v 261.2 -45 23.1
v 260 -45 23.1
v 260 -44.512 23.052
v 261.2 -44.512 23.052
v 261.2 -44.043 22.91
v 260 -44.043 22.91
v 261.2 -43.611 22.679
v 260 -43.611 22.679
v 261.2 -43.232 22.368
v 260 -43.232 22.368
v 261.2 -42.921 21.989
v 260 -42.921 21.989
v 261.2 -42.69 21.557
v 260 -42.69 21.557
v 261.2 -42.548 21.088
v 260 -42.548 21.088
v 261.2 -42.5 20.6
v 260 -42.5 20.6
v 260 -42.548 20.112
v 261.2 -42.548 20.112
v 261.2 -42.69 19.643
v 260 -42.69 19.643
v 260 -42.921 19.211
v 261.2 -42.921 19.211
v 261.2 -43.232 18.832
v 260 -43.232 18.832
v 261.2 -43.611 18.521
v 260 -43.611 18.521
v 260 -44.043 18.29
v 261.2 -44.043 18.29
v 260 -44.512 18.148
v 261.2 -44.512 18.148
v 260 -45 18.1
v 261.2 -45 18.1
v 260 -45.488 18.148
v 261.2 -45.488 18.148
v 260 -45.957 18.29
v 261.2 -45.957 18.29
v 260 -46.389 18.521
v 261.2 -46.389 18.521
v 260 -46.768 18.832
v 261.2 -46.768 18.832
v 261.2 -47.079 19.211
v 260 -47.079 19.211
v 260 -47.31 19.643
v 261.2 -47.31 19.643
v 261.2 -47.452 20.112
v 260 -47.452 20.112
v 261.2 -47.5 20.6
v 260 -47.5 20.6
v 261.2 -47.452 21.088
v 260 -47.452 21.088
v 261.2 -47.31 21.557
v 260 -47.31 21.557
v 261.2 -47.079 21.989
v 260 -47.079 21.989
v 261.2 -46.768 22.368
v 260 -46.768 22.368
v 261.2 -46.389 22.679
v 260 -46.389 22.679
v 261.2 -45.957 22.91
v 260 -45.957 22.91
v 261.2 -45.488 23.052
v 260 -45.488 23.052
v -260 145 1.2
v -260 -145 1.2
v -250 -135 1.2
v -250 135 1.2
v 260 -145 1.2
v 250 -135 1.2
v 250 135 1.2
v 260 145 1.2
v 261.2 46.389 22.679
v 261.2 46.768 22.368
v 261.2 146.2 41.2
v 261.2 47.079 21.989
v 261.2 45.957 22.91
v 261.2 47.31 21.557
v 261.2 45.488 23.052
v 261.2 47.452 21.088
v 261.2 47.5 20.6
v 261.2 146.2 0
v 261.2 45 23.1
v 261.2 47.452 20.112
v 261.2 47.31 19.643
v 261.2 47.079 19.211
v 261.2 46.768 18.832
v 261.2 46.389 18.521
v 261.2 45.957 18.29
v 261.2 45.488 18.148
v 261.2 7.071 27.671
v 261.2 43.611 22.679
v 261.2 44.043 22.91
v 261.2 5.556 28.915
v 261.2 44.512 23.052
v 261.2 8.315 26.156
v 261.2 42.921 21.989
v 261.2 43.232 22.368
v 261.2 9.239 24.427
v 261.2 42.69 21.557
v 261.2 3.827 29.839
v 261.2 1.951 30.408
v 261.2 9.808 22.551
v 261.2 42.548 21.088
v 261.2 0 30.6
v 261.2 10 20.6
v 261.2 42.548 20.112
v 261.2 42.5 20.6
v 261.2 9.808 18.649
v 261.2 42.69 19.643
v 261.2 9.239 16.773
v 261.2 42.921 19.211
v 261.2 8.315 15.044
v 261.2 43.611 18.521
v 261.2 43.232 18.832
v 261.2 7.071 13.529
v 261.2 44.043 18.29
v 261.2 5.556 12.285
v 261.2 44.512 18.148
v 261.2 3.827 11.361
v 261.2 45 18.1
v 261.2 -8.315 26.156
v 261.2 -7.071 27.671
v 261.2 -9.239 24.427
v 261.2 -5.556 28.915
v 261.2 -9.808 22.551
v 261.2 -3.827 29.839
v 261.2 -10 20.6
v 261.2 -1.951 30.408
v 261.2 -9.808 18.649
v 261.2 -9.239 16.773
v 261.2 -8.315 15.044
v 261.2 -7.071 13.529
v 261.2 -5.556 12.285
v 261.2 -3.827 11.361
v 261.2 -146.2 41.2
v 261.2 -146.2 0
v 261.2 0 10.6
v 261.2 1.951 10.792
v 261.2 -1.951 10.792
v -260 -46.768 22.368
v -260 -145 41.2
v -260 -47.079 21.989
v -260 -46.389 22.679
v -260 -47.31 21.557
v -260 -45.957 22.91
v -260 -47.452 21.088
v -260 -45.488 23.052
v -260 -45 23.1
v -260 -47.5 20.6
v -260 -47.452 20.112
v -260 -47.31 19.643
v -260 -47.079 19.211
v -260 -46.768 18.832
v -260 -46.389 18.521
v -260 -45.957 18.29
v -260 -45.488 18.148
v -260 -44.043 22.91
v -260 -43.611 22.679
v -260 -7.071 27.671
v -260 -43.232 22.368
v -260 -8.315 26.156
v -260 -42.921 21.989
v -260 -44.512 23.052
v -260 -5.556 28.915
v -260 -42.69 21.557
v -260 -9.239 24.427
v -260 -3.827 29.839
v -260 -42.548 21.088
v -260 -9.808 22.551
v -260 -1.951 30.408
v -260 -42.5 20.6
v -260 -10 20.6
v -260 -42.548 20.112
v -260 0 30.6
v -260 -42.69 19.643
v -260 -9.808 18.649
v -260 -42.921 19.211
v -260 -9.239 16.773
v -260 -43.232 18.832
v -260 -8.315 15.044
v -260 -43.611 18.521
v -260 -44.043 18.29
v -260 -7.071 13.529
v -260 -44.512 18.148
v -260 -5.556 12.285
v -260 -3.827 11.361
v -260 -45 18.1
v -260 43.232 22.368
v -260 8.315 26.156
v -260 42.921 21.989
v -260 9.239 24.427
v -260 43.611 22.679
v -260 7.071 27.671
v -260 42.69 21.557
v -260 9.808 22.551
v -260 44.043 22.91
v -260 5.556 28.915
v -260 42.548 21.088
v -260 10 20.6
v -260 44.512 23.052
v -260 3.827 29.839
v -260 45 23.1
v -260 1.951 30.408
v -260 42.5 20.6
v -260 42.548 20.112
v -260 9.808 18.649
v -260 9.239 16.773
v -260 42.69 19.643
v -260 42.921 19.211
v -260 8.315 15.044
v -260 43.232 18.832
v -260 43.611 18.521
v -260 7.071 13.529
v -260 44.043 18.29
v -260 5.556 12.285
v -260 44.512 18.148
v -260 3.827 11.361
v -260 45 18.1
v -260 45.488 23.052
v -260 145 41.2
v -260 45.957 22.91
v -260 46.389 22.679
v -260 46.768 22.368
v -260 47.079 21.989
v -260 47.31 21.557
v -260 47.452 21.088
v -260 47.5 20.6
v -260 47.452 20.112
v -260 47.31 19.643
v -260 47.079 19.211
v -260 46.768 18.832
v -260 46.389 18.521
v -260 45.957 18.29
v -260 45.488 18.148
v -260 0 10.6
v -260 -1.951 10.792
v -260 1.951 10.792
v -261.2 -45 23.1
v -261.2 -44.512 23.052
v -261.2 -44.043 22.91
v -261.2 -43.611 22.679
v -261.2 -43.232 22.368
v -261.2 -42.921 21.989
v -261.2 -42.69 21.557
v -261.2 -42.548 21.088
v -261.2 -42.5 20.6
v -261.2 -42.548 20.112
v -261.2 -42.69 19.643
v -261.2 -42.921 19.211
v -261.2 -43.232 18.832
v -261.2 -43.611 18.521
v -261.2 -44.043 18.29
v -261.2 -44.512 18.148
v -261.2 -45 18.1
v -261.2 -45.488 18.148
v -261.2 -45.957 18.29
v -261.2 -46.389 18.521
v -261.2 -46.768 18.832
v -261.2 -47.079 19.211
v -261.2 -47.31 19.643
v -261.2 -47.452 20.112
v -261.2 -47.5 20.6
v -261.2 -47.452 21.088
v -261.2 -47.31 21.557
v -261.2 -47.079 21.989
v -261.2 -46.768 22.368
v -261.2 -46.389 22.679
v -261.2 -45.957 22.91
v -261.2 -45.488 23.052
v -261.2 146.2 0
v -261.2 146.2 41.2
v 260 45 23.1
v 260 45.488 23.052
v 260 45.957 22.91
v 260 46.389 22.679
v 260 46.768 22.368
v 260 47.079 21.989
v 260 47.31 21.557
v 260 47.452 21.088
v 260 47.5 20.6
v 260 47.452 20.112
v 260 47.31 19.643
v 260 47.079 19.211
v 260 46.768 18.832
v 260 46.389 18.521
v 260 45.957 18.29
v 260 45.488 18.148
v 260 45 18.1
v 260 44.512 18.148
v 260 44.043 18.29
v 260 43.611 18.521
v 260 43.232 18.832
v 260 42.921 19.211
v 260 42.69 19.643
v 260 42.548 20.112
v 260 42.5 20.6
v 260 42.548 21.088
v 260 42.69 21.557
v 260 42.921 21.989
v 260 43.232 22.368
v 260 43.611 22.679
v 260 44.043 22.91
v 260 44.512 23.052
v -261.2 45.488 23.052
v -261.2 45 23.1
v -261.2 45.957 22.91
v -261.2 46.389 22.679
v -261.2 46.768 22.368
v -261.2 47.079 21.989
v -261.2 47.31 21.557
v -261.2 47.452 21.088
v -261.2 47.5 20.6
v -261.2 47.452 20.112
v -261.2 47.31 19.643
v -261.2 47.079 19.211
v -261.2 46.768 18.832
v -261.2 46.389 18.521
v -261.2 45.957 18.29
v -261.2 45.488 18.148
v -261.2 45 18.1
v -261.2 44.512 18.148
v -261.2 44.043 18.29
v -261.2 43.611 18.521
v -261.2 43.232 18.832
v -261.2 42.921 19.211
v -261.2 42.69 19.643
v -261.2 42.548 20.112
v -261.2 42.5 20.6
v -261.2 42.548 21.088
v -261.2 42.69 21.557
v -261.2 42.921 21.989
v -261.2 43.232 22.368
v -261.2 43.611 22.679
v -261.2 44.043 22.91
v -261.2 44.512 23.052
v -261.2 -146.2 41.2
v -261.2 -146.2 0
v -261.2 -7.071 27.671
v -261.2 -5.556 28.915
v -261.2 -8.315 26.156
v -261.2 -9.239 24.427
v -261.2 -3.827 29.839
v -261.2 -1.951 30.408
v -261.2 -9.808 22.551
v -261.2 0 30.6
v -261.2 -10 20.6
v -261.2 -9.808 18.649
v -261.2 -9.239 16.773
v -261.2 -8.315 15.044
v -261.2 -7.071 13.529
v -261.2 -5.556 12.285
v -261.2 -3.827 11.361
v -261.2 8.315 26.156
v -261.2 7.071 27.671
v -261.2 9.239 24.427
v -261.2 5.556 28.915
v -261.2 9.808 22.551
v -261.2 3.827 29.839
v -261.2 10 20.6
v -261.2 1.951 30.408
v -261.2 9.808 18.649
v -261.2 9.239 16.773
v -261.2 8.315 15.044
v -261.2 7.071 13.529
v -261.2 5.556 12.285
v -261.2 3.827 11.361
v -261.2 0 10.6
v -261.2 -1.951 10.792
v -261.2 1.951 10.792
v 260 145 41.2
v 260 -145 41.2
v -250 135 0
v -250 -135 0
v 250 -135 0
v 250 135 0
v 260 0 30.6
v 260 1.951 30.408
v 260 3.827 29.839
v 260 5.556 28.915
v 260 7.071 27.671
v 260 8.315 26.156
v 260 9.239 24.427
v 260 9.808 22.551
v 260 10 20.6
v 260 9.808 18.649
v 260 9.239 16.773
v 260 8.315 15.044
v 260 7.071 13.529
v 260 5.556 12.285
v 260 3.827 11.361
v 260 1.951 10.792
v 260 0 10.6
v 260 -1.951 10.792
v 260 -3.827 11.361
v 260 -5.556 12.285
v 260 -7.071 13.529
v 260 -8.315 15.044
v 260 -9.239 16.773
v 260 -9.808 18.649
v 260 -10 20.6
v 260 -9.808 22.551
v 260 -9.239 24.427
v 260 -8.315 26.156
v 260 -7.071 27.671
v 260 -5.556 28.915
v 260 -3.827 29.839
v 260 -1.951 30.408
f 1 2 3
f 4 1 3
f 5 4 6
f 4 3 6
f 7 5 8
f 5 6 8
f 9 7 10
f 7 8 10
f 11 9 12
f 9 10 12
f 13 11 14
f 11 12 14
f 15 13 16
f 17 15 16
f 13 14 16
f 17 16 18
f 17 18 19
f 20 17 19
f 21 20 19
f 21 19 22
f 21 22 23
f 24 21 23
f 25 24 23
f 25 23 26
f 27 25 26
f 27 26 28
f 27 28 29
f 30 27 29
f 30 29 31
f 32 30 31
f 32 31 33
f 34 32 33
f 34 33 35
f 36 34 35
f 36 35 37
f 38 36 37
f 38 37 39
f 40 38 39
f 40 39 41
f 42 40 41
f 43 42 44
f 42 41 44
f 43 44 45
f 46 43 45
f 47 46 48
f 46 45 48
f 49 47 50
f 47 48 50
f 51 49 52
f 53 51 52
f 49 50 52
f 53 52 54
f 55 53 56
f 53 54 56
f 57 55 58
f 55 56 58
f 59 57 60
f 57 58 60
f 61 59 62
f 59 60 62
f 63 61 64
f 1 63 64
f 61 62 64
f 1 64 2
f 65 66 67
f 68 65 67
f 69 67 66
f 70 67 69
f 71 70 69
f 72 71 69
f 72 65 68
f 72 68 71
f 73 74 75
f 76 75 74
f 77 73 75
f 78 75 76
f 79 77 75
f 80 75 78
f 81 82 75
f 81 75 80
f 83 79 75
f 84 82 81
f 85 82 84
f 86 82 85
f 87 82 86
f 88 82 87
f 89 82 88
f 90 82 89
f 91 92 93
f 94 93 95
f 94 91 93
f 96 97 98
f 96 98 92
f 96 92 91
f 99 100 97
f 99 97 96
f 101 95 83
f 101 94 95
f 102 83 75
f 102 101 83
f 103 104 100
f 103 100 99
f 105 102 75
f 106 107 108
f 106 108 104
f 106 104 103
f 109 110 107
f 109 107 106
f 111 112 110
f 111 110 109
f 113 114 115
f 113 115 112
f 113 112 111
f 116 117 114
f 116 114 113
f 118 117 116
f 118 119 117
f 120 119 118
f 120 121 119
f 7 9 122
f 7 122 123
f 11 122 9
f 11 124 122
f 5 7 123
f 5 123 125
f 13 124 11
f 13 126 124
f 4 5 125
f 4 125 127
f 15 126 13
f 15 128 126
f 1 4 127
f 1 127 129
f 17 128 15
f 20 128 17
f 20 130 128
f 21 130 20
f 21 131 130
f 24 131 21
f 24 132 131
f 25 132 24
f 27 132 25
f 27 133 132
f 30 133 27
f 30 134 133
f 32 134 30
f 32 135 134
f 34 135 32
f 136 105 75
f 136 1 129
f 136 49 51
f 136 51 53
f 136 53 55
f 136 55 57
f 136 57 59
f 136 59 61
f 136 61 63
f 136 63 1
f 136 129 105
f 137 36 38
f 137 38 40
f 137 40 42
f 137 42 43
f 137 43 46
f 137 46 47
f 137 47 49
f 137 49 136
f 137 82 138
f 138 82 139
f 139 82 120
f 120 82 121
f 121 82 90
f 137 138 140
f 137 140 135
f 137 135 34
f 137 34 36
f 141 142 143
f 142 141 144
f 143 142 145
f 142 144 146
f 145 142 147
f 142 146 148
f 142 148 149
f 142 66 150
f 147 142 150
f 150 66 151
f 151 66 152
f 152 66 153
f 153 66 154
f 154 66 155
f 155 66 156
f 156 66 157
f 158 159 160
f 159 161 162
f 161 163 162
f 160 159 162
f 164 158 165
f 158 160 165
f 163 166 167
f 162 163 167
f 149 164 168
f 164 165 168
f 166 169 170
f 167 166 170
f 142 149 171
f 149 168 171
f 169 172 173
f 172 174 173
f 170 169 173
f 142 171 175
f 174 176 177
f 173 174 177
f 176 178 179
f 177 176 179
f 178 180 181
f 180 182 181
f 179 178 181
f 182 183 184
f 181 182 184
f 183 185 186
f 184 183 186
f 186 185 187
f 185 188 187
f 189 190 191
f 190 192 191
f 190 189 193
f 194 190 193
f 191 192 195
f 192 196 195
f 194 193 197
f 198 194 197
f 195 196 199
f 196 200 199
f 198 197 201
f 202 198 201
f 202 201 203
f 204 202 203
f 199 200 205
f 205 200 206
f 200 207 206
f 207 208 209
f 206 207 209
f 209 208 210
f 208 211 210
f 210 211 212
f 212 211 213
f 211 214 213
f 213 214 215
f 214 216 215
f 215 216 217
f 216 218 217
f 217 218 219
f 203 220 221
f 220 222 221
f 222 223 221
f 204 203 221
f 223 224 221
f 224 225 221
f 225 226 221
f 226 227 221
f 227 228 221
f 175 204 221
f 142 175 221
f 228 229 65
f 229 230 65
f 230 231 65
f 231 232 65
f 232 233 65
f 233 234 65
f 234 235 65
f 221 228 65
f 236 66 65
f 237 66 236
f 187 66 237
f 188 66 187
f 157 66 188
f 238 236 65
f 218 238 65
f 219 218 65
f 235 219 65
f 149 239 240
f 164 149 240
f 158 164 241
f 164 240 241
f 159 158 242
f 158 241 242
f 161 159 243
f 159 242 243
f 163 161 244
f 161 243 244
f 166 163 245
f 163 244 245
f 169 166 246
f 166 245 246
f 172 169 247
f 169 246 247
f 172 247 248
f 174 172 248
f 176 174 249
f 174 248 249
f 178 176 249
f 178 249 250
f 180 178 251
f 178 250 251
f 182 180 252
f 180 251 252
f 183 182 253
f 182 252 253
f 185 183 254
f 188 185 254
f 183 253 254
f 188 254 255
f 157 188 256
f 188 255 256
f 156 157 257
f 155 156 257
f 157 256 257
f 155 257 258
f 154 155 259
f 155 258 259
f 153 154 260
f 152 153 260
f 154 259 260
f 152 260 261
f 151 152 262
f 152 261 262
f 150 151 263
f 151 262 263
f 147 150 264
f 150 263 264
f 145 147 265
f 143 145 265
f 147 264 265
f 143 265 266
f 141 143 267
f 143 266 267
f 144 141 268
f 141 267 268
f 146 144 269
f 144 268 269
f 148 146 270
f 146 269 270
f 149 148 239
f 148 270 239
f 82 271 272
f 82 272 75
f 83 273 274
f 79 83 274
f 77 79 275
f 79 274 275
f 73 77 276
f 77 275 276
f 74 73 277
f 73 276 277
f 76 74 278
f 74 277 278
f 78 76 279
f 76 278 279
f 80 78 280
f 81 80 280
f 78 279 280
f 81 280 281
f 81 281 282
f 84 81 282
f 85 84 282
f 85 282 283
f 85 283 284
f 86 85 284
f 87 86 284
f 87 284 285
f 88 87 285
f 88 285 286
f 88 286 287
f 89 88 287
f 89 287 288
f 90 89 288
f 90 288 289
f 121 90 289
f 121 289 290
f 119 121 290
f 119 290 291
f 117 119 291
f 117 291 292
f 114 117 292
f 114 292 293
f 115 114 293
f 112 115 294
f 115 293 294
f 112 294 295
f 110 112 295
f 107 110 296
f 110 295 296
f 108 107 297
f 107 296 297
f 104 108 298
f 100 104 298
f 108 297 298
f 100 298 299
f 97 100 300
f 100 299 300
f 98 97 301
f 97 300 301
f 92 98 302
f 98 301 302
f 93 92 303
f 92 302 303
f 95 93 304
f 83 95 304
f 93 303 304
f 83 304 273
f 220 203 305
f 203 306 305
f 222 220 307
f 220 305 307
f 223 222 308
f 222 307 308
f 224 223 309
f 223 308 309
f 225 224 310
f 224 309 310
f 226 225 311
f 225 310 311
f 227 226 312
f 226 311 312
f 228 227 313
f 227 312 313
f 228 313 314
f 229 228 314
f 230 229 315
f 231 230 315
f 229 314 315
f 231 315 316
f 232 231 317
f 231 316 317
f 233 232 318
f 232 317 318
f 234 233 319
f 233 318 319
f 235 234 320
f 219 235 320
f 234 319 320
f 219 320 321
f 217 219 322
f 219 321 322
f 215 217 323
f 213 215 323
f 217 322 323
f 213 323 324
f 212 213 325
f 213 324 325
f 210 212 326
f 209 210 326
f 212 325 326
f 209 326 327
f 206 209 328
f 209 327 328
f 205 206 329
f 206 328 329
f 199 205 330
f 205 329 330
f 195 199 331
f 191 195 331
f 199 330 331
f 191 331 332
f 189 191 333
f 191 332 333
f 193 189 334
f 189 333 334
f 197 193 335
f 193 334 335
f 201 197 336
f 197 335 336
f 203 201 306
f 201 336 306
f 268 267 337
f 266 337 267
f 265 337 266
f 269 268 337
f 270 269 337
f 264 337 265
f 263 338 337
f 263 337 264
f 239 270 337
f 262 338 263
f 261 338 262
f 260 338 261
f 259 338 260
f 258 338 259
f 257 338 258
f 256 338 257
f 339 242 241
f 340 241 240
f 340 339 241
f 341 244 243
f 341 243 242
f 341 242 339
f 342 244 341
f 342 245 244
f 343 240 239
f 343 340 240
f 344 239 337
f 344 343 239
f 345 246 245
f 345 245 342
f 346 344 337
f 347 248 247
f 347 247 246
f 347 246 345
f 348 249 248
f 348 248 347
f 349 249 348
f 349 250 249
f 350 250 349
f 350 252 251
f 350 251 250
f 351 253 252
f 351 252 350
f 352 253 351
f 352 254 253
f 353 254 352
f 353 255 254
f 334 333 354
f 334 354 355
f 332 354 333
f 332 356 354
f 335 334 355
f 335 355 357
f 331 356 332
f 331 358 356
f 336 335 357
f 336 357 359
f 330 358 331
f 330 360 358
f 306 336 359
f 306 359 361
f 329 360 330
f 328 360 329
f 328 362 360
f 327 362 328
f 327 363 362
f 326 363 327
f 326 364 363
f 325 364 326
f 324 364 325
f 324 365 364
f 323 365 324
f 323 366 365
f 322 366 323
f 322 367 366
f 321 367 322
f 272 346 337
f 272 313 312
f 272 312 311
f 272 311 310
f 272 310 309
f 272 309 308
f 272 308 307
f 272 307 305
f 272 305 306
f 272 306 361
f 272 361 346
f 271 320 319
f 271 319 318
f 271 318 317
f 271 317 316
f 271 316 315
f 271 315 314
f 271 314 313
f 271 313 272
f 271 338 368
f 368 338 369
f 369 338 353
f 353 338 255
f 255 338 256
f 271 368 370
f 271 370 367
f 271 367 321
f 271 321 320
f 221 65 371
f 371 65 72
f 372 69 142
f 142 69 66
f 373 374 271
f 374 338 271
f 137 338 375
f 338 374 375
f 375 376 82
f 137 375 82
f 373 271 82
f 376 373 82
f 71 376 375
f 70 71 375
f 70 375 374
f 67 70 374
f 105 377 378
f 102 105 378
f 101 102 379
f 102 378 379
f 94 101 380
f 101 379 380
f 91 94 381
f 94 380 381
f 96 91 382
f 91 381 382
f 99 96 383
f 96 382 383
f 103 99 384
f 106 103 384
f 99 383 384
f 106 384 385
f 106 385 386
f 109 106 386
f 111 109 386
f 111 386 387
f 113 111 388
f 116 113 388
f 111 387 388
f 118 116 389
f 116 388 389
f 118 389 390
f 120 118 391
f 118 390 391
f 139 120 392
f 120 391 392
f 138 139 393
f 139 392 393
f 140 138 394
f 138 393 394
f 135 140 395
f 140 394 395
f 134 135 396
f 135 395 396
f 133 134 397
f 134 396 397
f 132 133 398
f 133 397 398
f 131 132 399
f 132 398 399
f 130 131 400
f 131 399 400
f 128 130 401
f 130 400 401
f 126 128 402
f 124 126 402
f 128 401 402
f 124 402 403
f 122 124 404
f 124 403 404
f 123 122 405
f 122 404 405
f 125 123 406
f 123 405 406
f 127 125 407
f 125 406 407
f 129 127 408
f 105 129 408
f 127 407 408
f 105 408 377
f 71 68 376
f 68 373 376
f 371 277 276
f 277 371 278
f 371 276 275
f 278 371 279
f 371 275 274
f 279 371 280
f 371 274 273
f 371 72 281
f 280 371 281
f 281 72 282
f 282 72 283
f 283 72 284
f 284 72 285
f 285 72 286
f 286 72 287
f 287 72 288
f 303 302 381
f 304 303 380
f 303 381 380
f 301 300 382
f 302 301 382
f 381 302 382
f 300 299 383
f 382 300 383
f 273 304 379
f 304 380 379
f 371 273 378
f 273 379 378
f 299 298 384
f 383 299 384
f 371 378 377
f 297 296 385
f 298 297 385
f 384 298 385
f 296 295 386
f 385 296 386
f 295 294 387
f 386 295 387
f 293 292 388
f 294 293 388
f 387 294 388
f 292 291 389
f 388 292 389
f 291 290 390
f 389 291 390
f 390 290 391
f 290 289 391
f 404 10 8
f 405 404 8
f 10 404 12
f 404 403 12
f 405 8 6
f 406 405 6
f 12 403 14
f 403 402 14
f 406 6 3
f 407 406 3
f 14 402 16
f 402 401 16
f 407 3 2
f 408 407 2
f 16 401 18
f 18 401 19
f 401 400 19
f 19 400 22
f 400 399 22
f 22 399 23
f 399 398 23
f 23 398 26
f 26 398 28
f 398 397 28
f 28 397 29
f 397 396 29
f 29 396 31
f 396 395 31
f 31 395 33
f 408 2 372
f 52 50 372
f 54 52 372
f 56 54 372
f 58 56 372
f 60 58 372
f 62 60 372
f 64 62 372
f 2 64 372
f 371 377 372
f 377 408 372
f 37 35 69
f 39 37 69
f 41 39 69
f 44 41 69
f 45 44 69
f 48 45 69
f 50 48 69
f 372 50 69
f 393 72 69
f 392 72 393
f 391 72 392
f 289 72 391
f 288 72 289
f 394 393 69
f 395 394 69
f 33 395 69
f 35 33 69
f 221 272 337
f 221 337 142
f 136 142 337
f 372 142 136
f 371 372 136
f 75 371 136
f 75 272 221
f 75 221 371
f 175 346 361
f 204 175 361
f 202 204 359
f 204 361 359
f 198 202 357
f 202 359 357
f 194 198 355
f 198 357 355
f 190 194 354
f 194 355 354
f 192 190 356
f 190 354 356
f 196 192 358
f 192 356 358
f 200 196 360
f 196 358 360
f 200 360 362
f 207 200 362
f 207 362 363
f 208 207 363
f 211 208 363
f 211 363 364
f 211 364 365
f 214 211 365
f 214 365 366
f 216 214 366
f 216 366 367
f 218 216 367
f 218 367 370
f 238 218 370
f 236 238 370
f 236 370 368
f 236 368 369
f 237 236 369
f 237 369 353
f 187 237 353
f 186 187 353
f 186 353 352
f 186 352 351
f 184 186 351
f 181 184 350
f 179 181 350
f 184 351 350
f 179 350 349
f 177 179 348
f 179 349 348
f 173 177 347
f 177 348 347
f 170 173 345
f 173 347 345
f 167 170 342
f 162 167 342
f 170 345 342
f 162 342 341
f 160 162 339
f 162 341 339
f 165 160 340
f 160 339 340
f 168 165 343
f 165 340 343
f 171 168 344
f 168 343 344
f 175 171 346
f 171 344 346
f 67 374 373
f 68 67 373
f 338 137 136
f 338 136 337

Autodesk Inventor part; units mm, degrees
ref_plane "YZ Plane" through (0, 0, 0) normal (1, 0, 0) x (0, 1, 0)
ref_plane "XZ Plane" through (0, 0, 0) normal (0, 1, 0) x (-1, 0, 0)
ref_plane "XY Plane" through (0, 0, 0) normal (0, 0, 1) x (1, 0, 0)
sketch "Boceto1" plane through (0, 0, 0) normal (0, 0, 1) x (1, 0, 0)
  line L0 (261.2, -146.2) -> (-261.2, -146.2)
  line L1 (-261.2, -146.2) -> (-261.2, 146.2)
  line L2 (-261.2, 146.2) -> (261.2, 146.2)
  line L3 (261.2, 146.2) -> (261.2, -146.2)
  line L4 (261.2, -146.2) -> (-261.2, 146.2) construction
  line L5 (-261.2, -146.2) -> (261.2, 146.2) construction
  line L6 (250, -135) -> (-250, -135)
  line L7 (-250, -135) -> (-250, 135)
  line L8 (-250, 135) -> (250, 135)
  line L9 (250, 135) -> (250, -135)
  line L10 (250, -135) -> (-250, 135) construction
  line L11 (-250, -135) -> (250, 135) construction
  point P0 (0, 0)
  dimension "d0" = 522.4
  dimension "d1" = 292.4
  dimension "d2" = 500
  dimension "d3" = 270
extrude "Extrusión1" add sketch "Boceto1" along normal blind 1.2
sketch "Boceto2" plane through (0, 0, 1.2) normal (0, 0, 1) x (1, 0, 0)
  line L0 (261.2, 146.2) -> (-261.2, 146.2) projected
  line L1 (-261.2, 146.2) -> (-261.2, -146.2) projected
  line L2 (261.2, -146.2) -> (261.2, 146.2) projected
  line L3 (-261.2, -146.2) -> (261.2, -146.2) projected
  line L4 (-260, 145) -> (260, 145)
  line L5 (260, 145) -> (260, -145)
  line L6 (260, -145) -> (-260, -145)
  line L7 (-260, -145) -> (-260, 145)
  point P0 (0, 0)
  dimension "d6" = 1.2
extrude "Extrusión2" add sketch "Boceto2" along normal blind 40
sketch "Boceto3" plane through (-261.2, -146.2, 0) normal (-1, 0, 0) x (0, 0, 1)
  line L0 (41.2, 292.4) -> (41.2, 0) projected
  line L1 (0, 292.4) -> (0, 0) projected
  line L2 (0, 0) -> (41.2, 0) projected
  line L3 (41.2, 292.4) -> (41.2, 0) projected
  line L4 (0, 292.4) -> (41.2, 292.4) projected
  circle A0 centre (20.6, 146.2) radius 10
  line L5 (10.6, 191.2) -> (30.6, 191.2)
  line L6 (30.6, 191.2) -> (30.6, 101.2)
  line L7 (30.6, 101.2) -> (10.6, 101.2)
  line L8 (10.6, 101.2) -> (10.6, 191.2)
  line L9 (10.6, 191.2) -> (30.6, 101.2) construction
  line L10 (30.6, 191.2) -> (10.6, 101.2) construction
  circle A1 centre (20.6, 191.2) radius 2.5
  circle A2 centre (20.6, 101.2) radius 2.5
  point P0 (0, 146.2)
  dimension "d9" = 20
  dimension "d12" = 90
  dimension "d13" = 5
  dimension "d14" = 5
extrude "Extrusión3" cut sketch "Boceto3" against normal blind 1000 contours A0
extrude "Extrusión4" cut sketch "Boceto3" against normal blind 1000 contours A1 L5 | L5 A1 | A2 L7 | L7 A2
properties part number "marco_ir"
